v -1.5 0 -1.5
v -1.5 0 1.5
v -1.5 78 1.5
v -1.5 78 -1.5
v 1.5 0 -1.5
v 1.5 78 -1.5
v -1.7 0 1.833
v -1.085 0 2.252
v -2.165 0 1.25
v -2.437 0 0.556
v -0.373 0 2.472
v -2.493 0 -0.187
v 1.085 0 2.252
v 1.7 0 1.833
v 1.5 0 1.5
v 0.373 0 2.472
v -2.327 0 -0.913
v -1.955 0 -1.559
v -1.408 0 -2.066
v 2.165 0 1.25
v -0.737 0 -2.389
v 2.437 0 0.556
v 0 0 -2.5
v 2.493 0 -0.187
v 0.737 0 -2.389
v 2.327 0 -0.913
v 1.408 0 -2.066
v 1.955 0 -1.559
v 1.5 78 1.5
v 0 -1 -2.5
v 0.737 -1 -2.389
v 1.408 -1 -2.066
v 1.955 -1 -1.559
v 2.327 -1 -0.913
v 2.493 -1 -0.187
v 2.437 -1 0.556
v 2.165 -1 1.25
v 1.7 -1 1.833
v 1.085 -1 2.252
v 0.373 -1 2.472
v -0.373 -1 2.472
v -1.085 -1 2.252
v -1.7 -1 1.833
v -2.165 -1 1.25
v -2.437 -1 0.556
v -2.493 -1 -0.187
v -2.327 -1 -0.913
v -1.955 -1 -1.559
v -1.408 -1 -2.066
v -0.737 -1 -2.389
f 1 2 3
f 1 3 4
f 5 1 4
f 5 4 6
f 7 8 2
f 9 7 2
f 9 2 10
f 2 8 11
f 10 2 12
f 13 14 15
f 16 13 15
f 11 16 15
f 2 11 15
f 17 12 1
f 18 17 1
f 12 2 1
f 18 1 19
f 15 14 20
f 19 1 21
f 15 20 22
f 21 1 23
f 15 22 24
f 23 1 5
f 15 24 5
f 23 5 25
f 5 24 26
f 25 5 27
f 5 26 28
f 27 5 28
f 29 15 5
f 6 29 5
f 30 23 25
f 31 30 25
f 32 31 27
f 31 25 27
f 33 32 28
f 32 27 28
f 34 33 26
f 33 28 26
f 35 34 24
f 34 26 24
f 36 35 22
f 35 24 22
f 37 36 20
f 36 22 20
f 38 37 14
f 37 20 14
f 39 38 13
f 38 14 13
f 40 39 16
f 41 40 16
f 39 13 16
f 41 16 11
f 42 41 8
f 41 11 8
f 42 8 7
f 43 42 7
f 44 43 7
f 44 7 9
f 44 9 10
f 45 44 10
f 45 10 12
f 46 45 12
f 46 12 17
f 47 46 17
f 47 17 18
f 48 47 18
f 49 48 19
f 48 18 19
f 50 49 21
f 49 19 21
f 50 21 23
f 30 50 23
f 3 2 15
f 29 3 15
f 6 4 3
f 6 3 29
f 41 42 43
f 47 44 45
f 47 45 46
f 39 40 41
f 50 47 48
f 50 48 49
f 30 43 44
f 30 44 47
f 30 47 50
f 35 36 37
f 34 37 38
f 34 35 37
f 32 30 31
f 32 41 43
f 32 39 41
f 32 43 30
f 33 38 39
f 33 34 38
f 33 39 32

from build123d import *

# Parameters (mm, degrees)
ESQUISSE1_W             = 3
ESQUISSE1_H             = 3
BOSS_EXTRU_1_DEPTH      = 95
ESQUISSE2_R             = 2.5
BOSS_EXTRU_2_DEPTH      = 1
ESQUISSE3_W             = 3
ESQUISSE3_H             = 3
ENL_V_MAT_EXTRU_1_DEPTH = 17


with BuildPart() as part:
    # Esquisse1 → Boss.-Extru.1 (new body)
    with BuildSketch(Plane(origin=(0, 0, 0), x_dir=(1, 0, 0), z_dir=(0, 1, 0))):
        Rectangle(ESQUISSE1_W, ESQUISSE1_H)
    extrude(amount=BOSS_EXTRU_1_DEPTH)

    # Esquisse2 → Boss.-Extru.2 (add)
    with BuildSketch(Plane.XZ):
        with Locations(Location((0, 0, 0), (0, 0, 270))):
            Circle(ESQUISSE2_R)
    extrude(amount=BOSS_EXTRU_2_DEPTH)

    # Esquisse3 → Enlèv. mat.-Extru.1 (cut)
    with BuildSketch(Plane(origin=(0, 95, 0), x_dir=(1, 0, 0), z_dir=(0, 1, 0))):
        Rectangle(ESQUISSE3_W, ESQUISSE3_H)
    extrude(amount=-ENL_V_MAT_EXTRU_1_DEPTH, mode=Mode.SUBTRACT)


solid = part.part
